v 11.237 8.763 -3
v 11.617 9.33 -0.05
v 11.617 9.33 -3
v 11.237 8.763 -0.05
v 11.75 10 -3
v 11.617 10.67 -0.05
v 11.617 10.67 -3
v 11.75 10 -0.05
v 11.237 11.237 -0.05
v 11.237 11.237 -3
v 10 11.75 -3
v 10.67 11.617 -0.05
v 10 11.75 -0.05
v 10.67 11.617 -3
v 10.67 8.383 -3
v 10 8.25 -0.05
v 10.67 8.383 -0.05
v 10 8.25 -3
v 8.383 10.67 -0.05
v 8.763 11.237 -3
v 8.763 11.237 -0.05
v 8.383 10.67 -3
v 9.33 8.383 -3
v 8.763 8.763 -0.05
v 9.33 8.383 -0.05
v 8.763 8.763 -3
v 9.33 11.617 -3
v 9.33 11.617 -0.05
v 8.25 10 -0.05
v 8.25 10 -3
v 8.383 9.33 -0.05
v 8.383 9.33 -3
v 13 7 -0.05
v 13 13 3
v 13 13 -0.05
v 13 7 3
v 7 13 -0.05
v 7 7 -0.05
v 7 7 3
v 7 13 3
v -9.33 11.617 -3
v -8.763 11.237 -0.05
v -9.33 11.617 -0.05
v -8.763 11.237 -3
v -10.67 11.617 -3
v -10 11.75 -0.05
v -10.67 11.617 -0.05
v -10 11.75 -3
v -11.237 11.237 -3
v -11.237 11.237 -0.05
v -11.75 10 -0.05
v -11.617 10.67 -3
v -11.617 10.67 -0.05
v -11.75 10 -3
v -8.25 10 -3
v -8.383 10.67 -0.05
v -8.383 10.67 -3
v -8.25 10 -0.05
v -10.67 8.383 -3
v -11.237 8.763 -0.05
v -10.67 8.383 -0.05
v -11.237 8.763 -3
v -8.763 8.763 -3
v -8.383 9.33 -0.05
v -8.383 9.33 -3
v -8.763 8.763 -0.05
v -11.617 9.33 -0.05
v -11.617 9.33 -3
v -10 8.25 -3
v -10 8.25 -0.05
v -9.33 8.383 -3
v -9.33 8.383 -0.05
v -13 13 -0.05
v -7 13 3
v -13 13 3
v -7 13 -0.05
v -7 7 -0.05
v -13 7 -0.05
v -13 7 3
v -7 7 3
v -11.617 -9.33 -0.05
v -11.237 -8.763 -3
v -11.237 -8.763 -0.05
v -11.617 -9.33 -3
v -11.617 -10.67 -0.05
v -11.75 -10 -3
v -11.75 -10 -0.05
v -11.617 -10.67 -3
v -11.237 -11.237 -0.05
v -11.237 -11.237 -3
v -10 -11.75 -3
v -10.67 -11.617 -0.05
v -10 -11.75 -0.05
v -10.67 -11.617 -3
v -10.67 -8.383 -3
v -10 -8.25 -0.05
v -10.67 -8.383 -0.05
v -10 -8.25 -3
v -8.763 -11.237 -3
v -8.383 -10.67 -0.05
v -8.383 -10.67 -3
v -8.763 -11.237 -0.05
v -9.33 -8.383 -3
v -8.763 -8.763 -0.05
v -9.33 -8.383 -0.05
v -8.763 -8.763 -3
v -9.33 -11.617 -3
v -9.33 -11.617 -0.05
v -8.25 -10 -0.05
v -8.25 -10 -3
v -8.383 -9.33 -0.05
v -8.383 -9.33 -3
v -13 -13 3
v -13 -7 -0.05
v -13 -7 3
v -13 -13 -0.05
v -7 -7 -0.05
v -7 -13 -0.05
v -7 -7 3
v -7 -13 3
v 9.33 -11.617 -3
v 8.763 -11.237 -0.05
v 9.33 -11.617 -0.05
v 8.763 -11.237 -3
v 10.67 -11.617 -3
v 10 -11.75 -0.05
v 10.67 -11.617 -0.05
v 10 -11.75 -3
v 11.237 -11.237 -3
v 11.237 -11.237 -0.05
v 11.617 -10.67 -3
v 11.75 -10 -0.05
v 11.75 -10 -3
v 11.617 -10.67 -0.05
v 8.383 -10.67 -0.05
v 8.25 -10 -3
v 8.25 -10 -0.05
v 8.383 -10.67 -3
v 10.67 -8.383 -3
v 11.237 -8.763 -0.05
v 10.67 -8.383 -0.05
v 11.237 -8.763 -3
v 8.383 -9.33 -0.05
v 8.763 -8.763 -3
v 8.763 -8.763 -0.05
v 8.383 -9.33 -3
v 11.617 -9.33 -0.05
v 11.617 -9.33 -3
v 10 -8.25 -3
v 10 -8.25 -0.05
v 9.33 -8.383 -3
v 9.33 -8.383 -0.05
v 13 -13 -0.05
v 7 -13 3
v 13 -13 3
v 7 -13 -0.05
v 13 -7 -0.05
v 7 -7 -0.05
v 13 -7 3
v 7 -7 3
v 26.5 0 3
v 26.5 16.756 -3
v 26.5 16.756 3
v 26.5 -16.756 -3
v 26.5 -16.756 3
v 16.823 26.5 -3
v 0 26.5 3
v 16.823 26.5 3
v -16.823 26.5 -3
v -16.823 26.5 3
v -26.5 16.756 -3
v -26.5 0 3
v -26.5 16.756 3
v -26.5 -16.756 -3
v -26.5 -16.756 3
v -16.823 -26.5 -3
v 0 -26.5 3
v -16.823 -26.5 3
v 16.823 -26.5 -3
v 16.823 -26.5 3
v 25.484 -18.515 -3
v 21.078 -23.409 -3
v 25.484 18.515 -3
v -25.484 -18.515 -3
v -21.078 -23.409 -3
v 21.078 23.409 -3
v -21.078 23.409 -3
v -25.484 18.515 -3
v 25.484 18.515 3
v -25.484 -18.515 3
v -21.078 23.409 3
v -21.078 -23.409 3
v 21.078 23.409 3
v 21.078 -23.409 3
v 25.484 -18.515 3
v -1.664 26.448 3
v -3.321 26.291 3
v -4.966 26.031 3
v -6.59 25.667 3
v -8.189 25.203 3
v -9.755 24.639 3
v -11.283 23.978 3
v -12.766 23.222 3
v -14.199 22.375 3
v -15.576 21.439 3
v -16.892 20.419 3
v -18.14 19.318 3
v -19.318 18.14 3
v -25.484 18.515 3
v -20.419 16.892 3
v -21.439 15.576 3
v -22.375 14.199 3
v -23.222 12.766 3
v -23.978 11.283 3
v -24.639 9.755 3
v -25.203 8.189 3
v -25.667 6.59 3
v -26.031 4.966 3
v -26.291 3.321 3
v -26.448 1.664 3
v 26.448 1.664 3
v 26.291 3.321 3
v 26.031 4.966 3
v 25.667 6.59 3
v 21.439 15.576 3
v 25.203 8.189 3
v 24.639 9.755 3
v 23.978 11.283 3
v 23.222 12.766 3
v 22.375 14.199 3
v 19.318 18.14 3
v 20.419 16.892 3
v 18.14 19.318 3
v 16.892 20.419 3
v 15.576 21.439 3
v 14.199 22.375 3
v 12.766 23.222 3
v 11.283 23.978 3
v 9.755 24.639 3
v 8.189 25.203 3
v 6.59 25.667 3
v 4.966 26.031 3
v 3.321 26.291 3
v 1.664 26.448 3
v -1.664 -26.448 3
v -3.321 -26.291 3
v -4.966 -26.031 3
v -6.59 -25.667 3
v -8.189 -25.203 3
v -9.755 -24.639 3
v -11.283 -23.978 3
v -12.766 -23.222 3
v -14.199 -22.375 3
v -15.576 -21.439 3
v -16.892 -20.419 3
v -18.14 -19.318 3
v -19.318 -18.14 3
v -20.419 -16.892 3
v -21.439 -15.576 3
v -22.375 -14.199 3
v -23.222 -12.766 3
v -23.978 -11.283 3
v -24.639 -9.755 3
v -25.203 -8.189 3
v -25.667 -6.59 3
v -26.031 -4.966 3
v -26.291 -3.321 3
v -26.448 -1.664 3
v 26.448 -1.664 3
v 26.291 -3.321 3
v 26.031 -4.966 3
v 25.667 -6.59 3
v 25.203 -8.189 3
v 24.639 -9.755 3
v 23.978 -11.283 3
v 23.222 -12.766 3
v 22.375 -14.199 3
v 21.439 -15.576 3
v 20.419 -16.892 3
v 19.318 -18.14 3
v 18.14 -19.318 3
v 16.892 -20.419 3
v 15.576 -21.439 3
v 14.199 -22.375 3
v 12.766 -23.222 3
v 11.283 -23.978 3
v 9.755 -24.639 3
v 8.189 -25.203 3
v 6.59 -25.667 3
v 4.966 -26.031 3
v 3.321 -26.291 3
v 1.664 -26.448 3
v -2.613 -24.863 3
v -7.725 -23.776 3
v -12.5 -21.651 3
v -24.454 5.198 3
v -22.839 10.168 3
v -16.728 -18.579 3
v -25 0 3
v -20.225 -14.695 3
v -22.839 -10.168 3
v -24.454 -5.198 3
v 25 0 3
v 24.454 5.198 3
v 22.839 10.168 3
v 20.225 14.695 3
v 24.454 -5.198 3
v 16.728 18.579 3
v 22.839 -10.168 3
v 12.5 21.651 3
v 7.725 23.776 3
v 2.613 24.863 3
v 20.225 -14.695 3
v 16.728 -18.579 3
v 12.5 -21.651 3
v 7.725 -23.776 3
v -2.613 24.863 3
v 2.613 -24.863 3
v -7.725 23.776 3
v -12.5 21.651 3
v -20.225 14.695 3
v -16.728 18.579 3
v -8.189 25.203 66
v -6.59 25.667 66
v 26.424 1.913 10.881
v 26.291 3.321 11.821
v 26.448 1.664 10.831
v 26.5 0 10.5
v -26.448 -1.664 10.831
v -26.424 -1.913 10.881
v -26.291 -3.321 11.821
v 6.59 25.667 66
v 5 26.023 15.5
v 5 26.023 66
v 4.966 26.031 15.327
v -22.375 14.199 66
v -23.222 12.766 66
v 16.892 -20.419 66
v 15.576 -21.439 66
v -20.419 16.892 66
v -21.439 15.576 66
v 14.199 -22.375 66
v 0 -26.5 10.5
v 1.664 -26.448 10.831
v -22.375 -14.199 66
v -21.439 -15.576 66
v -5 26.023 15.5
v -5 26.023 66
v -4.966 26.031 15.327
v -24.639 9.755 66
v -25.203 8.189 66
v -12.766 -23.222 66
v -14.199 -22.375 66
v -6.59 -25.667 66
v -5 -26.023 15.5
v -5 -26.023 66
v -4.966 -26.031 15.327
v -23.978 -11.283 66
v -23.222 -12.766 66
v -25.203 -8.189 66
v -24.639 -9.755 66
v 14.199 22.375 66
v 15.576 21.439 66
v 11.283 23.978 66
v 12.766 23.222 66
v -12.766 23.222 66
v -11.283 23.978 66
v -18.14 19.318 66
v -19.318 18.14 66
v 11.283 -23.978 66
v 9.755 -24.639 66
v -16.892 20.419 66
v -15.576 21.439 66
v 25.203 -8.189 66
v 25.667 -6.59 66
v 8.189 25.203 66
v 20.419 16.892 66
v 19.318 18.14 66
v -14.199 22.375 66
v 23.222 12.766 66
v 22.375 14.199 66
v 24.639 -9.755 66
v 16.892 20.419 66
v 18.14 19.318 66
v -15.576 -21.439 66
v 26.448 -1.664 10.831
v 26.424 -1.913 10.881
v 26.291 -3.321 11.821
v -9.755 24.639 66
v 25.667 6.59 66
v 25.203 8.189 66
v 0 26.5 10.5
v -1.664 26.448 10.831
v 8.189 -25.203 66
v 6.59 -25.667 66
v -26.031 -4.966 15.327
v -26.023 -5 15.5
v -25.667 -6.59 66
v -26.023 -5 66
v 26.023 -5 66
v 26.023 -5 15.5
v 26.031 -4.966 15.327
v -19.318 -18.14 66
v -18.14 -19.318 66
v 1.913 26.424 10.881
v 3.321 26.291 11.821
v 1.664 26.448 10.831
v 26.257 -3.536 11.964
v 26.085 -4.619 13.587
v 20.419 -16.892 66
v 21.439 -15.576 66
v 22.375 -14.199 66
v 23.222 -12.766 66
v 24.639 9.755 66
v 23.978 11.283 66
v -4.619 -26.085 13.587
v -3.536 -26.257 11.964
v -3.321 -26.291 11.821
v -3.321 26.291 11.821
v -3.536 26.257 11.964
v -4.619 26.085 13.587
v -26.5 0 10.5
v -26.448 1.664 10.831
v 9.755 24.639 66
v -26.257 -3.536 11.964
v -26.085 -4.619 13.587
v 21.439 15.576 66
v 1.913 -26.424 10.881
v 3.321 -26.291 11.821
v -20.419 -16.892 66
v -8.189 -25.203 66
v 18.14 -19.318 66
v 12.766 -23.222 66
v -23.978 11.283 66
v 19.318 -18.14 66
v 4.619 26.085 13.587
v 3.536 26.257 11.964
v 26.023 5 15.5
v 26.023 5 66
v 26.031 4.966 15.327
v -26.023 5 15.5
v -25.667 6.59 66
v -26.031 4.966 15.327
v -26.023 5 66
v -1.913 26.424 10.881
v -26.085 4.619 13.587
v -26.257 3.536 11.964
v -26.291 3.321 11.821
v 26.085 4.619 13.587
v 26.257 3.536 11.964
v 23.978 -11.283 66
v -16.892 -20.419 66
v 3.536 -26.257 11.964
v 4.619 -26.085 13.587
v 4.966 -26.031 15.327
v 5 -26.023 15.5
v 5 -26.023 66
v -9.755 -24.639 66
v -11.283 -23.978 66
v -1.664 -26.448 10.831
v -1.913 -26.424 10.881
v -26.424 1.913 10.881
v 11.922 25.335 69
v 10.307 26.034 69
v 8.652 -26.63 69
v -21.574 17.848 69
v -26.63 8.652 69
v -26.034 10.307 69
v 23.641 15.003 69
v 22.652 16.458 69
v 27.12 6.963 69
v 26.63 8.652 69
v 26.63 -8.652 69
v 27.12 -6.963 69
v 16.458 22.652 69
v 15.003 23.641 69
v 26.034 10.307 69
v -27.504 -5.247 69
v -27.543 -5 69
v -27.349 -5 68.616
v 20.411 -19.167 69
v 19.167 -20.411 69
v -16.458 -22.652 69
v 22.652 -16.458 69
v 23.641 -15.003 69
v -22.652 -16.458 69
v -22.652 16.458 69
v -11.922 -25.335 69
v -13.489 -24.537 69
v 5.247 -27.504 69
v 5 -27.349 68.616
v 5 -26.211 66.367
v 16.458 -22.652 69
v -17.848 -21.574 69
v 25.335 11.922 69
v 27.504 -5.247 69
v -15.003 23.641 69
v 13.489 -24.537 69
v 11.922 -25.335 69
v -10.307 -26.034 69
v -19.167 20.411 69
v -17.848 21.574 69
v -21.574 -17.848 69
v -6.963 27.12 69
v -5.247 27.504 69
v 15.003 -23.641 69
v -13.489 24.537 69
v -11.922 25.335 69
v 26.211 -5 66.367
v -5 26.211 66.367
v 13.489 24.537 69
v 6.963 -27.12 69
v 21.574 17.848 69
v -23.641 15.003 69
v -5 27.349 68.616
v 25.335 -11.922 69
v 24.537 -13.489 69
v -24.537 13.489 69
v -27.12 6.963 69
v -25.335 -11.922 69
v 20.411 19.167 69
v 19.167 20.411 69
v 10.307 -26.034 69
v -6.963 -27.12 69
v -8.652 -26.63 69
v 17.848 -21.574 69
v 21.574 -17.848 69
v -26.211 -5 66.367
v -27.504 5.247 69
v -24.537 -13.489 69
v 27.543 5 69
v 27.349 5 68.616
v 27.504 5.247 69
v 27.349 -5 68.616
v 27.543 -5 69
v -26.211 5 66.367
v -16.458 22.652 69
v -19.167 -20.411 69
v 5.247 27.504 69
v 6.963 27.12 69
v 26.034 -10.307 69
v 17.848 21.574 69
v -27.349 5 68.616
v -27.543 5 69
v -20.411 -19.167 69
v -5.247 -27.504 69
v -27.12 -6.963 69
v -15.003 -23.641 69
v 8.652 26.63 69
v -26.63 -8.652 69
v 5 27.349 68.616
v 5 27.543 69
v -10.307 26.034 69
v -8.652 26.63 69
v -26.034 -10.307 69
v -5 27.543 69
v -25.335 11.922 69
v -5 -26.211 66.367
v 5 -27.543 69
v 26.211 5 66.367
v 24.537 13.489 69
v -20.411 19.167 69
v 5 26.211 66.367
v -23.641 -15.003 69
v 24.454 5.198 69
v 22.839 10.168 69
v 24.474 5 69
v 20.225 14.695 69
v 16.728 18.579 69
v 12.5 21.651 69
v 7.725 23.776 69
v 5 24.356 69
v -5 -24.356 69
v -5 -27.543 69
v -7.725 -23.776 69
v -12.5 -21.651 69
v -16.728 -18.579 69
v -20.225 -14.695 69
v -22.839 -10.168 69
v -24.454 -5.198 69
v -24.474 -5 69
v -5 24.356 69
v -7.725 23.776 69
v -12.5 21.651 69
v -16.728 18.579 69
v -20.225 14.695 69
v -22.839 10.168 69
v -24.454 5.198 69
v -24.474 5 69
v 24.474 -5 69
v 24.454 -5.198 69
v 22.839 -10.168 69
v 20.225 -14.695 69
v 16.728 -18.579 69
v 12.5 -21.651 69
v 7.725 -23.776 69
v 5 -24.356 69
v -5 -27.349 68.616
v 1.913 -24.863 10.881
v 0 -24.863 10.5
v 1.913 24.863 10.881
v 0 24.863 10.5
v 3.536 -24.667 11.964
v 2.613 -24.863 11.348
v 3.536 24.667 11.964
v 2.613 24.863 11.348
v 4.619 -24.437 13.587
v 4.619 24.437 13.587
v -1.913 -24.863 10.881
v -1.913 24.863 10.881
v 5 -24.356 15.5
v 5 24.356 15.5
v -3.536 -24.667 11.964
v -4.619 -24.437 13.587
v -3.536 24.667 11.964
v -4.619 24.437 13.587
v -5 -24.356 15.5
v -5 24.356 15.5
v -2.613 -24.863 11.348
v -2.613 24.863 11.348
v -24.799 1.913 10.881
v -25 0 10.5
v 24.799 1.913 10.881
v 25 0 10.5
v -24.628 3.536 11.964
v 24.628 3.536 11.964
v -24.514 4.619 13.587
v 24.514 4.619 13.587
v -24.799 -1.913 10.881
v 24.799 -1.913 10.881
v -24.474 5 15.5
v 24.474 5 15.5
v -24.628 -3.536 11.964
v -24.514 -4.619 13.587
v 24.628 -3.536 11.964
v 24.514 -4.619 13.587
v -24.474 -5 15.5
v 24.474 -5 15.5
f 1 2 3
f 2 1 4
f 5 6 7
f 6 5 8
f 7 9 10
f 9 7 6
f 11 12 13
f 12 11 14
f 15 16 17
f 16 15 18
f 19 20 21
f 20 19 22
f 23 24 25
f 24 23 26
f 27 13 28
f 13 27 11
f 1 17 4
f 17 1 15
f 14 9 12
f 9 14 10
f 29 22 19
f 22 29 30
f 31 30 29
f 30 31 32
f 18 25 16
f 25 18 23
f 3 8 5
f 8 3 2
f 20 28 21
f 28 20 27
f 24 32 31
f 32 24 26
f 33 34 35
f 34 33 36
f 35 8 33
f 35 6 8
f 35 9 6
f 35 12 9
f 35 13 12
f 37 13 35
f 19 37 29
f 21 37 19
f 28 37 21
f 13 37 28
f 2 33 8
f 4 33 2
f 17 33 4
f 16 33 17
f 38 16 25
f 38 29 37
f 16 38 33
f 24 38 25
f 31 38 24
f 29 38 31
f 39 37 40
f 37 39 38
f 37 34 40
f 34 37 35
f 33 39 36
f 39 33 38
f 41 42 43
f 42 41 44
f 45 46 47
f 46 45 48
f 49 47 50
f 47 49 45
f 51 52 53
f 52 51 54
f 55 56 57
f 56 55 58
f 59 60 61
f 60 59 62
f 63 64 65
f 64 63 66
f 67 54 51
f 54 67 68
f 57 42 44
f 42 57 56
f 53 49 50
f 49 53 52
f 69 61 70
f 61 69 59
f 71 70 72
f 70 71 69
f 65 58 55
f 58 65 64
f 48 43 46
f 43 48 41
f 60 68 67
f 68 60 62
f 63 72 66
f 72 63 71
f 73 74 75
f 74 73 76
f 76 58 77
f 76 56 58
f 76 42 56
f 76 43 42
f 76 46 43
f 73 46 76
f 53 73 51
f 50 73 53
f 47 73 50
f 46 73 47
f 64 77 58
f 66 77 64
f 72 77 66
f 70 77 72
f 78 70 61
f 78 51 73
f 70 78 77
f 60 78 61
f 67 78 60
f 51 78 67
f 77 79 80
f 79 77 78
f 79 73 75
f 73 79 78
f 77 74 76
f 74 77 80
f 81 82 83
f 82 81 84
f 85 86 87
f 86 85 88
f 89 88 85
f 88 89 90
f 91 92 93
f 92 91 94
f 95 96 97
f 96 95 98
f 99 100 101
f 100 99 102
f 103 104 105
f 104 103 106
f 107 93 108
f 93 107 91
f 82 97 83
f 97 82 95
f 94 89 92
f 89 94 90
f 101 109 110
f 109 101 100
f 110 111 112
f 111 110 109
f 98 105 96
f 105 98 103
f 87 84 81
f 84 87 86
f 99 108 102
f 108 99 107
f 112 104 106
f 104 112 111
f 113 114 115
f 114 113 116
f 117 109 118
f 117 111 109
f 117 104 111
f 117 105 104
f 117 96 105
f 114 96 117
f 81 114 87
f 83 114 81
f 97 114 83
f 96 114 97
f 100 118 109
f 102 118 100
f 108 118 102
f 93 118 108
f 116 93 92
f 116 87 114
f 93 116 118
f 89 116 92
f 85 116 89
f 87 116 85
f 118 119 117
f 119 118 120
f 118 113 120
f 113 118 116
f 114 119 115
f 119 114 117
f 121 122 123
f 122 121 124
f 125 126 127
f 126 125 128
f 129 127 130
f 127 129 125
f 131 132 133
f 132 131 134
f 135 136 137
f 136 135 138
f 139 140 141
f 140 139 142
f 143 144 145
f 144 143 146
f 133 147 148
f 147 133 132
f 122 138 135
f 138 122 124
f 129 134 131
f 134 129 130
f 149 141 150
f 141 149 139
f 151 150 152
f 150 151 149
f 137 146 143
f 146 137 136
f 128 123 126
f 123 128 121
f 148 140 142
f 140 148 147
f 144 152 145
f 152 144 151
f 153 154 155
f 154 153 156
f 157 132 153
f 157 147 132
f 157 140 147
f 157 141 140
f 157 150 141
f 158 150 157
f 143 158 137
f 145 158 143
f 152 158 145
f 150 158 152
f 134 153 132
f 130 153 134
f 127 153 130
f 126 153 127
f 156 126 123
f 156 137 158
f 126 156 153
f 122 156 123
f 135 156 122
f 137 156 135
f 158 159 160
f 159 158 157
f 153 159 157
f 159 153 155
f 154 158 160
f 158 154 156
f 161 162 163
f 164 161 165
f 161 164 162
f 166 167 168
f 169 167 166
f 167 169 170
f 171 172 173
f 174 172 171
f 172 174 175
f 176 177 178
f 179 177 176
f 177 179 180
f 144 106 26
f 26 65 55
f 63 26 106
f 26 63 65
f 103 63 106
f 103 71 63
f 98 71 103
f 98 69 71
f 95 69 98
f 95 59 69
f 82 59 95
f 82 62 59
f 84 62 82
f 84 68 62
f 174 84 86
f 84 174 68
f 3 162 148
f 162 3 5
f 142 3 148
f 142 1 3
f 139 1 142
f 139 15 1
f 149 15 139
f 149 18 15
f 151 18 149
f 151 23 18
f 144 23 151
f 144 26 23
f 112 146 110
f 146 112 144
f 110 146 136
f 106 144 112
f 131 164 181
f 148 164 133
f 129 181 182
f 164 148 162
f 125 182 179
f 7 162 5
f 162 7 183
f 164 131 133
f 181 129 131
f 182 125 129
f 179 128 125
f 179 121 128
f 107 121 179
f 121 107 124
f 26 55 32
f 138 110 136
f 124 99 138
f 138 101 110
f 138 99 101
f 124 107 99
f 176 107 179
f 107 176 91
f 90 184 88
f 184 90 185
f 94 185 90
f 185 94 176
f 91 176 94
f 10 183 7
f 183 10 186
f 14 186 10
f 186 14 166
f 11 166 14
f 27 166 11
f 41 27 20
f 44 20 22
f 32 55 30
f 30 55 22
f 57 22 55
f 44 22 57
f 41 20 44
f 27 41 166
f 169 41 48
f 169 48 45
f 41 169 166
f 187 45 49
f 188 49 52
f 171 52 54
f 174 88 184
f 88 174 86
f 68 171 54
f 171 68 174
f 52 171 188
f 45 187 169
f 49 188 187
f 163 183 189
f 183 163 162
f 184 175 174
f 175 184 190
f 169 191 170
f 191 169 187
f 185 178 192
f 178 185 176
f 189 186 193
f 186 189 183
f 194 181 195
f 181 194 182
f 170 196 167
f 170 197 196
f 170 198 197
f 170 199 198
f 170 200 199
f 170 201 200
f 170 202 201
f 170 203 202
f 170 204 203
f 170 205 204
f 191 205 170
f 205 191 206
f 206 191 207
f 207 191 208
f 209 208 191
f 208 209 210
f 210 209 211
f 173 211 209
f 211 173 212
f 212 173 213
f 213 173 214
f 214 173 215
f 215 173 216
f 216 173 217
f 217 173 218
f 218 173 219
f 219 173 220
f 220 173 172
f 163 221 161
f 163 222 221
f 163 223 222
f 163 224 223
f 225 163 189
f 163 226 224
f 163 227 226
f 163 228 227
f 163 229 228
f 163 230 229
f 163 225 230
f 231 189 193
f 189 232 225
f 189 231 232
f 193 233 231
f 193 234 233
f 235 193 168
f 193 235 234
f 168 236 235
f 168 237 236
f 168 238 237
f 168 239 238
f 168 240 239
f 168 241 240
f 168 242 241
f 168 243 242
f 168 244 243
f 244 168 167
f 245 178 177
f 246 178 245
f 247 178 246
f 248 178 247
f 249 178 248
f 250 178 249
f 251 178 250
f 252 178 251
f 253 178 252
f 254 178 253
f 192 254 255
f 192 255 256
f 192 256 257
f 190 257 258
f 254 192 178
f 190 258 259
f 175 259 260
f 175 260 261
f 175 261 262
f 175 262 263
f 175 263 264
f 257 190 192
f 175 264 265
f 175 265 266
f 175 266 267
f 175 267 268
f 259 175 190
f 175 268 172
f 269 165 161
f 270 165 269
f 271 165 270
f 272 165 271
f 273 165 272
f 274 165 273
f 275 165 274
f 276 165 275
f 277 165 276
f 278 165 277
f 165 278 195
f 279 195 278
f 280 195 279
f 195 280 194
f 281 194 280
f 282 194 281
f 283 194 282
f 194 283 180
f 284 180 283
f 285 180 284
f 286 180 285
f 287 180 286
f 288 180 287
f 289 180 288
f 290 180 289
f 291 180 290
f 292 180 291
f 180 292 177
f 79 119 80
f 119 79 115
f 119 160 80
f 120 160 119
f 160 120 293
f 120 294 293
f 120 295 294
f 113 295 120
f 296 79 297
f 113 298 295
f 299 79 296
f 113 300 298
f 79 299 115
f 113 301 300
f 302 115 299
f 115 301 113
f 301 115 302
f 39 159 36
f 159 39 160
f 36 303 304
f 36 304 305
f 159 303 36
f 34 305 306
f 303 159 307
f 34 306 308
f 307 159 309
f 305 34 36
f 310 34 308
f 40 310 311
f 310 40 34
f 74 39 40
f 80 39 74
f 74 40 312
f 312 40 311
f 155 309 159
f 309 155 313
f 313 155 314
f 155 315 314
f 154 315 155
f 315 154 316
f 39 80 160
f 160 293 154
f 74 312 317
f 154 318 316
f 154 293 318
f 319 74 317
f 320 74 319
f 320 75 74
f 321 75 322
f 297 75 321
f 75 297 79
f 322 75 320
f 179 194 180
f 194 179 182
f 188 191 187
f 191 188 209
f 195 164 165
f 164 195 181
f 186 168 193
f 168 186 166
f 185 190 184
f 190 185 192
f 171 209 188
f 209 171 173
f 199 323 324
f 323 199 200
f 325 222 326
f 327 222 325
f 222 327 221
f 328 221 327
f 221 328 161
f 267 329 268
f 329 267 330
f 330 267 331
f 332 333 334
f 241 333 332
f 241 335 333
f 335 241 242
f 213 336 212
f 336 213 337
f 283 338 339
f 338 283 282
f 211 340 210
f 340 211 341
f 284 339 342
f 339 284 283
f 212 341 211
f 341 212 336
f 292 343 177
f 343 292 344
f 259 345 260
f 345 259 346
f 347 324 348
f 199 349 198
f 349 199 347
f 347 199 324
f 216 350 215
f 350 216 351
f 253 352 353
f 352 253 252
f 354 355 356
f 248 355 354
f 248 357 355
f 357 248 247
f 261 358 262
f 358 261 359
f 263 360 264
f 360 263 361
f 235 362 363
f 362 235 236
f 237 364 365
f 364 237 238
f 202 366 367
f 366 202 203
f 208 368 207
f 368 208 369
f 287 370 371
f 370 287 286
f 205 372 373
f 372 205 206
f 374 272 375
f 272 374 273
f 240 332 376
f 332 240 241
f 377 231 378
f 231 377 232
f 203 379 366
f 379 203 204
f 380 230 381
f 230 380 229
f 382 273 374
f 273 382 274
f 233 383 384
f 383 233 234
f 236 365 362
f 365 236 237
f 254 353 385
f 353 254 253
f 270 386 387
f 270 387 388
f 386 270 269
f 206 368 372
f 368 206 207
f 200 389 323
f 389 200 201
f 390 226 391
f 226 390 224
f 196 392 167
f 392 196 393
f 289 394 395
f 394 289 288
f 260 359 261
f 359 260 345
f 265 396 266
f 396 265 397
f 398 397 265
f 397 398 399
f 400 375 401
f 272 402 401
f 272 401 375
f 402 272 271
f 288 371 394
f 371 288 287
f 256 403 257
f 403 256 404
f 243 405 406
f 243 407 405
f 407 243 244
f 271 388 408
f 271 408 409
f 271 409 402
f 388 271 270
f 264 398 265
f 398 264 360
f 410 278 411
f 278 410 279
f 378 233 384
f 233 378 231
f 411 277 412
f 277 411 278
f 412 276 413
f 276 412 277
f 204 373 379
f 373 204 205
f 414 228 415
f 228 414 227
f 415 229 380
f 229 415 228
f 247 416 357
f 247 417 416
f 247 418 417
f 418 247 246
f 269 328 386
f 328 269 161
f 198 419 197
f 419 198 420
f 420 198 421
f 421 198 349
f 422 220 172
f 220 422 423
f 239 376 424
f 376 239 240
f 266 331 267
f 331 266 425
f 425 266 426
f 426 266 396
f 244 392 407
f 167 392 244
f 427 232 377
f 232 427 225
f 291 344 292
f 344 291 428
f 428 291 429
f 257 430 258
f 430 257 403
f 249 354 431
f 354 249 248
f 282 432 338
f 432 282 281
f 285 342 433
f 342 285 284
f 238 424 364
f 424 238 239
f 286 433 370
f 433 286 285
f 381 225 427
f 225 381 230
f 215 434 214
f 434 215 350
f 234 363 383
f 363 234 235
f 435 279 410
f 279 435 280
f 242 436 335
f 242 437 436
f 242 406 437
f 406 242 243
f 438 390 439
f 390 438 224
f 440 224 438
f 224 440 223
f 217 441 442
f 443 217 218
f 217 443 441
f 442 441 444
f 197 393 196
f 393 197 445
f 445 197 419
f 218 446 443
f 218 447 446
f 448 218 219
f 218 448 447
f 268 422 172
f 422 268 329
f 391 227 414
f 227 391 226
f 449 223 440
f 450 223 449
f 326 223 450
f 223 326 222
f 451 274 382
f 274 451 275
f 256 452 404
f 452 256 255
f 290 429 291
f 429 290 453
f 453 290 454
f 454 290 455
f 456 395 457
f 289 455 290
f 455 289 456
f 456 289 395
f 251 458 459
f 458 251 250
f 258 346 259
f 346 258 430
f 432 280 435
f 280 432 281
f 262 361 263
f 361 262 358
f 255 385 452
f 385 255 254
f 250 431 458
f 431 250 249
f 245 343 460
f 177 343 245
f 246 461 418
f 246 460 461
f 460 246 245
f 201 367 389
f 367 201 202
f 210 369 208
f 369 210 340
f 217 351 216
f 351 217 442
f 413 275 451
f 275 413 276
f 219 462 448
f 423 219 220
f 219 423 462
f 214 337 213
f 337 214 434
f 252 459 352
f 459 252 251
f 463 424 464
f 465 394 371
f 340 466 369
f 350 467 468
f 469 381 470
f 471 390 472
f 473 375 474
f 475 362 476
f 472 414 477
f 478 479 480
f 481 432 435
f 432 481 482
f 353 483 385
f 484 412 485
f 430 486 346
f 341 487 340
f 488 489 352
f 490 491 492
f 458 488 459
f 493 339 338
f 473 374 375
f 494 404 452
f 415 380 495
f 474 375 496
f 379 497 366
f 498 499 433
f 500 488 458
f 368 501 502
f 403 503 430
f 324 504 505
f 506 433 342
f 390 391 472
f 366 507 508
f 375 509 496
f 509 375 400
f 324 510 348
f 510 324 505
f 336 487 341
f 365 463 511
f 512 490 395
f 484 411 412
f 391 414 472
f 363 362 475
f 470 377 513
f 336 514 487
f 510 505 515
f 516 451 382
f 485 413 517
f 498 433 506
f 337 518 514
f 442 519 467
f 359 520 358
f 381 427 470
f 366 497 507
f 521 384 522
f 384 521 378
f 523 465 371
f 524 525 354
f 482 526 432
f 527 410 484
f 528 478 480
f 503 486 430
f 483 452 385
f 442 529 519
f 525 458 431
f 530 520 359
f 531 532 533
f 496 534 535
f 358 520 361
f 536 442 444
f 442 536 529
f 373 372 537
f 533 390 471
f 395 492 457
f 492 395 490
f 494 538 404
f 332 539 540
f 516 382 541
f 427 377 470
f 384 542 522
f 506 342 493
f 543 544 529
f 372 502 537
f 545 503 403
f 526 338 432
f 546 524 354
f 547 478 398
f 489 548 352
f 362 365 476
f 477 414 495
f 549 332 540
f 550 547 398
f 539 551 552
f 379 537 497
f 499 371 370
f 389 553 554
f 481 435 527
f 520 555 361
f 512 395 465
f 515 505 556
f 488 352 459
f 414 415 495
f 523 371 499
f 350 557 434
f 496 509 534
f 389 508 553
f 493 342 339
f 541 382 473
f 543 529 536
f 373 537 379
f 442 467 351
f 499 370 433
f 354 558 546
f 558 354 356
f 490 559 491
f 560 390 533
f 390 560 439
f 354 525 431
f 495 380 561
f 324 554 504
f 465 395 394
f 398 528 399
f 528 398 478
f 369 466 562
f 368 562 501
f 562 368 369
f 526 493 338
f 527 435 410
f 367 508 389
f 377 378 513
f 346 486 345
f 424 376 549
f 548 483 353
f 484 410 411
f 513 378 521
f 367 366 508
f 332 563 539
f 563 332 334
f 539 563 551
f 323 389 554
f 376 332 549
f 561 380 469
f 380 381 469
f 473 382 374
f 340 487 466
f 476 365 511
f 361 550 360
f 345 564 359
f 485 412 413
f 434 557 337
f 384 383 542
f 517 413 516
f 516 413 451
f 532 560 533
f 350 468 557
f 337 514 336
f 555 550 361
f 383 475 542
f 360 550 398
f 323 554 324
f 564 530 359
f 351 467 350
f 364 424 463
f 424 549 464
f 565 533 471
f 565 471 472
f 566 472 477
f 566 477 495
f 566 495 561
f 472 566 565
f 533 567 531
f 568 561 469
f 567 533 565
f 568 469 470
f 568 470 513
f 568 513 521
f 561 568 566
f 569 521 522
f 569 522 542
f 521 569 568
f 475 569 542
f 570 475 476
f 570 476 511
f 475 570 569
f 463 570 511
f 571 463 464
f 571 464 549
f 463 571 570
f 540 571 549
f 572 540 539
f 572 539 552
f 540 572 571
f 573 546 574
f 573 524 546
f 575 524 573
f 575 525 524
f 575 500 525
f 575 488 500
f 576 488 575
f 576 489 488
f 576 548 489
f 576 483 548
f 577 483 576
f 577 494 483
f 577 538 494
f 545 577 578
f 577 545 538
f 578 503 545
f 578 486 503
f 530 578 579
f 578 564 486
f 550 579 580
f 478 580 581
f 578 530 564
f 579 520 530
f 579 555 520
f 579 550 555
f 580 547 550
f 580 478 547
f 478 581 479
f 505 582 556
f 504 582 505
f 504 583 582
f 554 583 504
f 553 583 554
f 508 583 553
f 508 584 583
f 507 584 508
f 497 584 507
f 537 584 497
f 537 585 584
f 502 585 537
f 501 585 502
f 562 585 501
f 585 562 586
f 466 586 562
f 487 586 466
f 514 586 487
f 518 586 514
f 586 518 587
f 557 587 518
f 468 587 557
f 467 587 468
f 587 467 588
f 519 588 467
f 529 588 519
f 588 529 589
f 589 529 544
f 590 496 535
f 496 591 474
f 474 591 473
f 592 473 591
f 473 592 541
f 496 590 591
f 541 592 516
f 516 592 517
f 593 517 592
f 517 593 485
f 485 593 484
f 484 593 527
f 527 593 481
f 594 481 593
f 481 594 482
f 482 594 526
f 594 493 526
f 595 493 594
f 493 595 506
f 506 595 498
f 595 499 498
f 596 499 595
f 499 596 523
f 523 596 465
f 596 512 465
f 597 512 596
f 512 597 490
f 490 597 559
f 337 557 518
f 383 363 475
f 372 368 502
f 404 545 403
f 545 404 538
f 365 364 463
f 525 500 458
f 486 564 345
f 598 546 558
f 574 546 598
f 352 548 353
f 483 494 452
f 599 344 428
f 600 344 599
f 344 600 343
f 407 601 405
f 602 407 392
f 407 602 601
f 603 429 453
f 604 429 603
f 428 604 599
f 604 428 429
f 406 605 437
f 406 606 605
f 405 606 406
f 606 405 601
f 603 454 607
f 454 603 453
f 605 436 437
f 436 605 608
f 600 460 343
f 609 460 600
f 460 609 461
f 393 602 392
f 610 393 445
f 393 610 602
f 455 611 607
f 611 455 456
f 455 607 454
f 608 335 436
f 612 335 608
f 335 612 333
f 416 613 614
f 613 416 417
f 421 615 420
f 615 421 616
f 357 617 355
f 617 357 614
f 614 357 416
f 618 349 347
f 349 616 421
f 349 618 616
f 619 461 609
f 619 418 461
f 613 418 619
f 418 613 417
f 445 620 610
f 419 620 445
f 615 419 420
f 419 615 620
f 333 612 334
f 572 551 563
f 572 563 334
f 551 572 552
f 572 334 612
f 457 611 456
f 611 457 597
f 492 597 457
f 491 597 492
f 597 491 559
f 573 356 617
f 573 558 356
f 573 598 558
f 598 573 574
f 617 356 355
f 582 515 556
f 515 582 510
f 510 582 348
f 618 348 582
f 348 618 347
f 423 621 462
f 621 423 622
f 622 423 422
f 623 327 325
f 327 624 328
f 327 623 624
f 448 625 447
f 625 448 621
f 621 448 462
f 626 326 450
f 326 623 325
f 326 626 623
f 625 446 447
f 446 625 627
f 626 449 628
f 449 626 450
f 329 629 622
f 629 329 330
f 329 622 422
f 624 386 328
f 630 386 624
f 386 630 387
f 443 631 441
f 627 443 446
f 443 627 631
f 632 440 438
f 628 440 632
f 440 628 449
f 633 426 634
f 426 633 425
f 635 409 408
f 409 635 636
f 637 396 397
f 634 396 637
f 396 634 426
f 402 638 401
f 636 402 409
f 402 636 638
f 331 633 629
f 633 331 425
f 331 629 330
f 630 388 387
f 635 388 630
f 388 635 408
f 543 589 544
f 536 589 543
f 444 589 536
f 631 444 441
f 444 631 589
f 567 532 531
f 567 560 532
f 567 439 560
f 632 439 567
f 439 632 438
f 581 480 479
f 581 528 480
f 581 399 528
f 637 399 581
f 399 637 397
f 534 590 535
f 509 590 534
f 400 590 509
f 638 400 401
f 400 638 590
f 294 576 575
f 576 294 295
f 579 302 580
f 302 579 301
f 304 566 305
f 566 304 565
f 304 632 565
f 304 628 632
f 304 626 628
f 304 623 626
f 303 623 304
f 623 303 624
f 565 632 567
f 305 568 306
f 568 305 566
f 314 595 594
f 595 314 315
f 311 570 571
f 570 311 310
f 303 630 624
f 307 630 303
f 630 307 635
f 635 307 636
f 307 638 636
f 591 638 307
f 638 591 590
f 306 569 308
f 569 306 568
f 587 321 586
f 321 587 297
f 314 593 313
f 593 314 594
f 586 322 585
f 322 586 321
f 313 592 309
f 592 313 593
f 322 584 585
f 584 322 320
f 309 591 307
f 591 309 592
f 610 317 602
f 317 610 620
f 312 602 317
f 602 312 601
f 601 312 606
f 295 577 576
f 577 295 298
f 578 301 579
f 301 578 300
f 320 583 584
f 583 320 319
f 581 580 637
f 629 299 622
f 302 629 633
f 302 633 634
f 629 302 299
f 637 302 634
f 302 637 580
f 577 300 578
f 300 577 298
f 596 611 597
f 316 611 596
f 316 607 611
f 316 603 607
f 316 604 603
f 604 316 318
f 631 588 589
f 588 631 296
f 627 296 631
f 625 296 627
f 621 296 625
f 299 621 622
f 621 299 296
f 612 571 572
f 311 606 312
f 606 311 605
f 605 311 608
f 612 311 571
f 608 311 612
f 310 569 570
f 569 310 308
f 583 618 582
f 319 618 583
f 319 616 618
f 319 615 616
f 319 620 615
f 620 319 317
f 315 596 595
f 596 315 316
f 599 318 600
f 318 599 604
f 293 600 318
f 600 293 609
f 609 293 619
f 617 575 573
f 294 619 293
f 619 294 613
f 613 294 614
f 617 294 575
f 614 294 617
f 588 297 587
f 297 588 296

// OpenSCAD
base_thickness=6;
base_diameter=63;

barrel_height=63;
barrel_diameter=53;
barrel_wall_thickness=3;

screw_shaft_diameter=3.5;
screw_head_diameter=6;
screw_spacing=20;

union() {
	// base
	difference() {
		cylinder(r=base_diameter/2, h=base_thickness, center=true);
		for(i = [0:3]) {
			rotate(a=[0, 0, 90*i]) translate([barrel_diameter/2 + (base_diameter+.1)/2, 0, 0]) 
				cube([base_diameter+.1, base_diameter+.1, base_thickness+.1], center=true);
	
			rotate(a=[0, 0, 90*i]) translate([screw_spacing/2, screw_spacing/2, 0]) {
				cylinder(r=screw_shaft_diameter/2, h=base_thickness*2, $fn=16, center=true);
				translate([0, 0, base_thickness/2 - (base_thickness - 3)/2]) 
					cube([screw_head_diameter, screw_head_diameter, base_thickness - 3 + .1], center=true);
			}
		}
	}
	
	// barrel
	translate([0, 0, barrel_height/2 + base_thickness/2]) {
		difference() {
			union() {
				cylinder(r=barrel_diameter/2, h=barrel_height, center=true, $fn=100);
				translate([0,0, barrel_height/2+1.5]) 
					cylinder(r1=barrel_diameter/2, r2=barrel_diameter/2+1.5, h=3, center=true, $fn=100);
			}
			cylinder(r=(barrel_diameter-barrel_wall_thickness)/2, h=barrel_height+6+.1, center=true);
	
			for (angle = [[0,0,0], [0,0,90]]) {
				rotate(a=angle) translate([0, 0, -(barrel_height - 25)/2]) {
					rotate(a=[90, 0, 0]) cylinder(r=5, h=barrel_diameter+.1, center=true);
					translate([0, 0, (barrel_height+.1)/2]) 
						cube([10, barrel_diameter+6+.1, barrel_height+.1], center=true);
				}
			}
		}
	}
}
